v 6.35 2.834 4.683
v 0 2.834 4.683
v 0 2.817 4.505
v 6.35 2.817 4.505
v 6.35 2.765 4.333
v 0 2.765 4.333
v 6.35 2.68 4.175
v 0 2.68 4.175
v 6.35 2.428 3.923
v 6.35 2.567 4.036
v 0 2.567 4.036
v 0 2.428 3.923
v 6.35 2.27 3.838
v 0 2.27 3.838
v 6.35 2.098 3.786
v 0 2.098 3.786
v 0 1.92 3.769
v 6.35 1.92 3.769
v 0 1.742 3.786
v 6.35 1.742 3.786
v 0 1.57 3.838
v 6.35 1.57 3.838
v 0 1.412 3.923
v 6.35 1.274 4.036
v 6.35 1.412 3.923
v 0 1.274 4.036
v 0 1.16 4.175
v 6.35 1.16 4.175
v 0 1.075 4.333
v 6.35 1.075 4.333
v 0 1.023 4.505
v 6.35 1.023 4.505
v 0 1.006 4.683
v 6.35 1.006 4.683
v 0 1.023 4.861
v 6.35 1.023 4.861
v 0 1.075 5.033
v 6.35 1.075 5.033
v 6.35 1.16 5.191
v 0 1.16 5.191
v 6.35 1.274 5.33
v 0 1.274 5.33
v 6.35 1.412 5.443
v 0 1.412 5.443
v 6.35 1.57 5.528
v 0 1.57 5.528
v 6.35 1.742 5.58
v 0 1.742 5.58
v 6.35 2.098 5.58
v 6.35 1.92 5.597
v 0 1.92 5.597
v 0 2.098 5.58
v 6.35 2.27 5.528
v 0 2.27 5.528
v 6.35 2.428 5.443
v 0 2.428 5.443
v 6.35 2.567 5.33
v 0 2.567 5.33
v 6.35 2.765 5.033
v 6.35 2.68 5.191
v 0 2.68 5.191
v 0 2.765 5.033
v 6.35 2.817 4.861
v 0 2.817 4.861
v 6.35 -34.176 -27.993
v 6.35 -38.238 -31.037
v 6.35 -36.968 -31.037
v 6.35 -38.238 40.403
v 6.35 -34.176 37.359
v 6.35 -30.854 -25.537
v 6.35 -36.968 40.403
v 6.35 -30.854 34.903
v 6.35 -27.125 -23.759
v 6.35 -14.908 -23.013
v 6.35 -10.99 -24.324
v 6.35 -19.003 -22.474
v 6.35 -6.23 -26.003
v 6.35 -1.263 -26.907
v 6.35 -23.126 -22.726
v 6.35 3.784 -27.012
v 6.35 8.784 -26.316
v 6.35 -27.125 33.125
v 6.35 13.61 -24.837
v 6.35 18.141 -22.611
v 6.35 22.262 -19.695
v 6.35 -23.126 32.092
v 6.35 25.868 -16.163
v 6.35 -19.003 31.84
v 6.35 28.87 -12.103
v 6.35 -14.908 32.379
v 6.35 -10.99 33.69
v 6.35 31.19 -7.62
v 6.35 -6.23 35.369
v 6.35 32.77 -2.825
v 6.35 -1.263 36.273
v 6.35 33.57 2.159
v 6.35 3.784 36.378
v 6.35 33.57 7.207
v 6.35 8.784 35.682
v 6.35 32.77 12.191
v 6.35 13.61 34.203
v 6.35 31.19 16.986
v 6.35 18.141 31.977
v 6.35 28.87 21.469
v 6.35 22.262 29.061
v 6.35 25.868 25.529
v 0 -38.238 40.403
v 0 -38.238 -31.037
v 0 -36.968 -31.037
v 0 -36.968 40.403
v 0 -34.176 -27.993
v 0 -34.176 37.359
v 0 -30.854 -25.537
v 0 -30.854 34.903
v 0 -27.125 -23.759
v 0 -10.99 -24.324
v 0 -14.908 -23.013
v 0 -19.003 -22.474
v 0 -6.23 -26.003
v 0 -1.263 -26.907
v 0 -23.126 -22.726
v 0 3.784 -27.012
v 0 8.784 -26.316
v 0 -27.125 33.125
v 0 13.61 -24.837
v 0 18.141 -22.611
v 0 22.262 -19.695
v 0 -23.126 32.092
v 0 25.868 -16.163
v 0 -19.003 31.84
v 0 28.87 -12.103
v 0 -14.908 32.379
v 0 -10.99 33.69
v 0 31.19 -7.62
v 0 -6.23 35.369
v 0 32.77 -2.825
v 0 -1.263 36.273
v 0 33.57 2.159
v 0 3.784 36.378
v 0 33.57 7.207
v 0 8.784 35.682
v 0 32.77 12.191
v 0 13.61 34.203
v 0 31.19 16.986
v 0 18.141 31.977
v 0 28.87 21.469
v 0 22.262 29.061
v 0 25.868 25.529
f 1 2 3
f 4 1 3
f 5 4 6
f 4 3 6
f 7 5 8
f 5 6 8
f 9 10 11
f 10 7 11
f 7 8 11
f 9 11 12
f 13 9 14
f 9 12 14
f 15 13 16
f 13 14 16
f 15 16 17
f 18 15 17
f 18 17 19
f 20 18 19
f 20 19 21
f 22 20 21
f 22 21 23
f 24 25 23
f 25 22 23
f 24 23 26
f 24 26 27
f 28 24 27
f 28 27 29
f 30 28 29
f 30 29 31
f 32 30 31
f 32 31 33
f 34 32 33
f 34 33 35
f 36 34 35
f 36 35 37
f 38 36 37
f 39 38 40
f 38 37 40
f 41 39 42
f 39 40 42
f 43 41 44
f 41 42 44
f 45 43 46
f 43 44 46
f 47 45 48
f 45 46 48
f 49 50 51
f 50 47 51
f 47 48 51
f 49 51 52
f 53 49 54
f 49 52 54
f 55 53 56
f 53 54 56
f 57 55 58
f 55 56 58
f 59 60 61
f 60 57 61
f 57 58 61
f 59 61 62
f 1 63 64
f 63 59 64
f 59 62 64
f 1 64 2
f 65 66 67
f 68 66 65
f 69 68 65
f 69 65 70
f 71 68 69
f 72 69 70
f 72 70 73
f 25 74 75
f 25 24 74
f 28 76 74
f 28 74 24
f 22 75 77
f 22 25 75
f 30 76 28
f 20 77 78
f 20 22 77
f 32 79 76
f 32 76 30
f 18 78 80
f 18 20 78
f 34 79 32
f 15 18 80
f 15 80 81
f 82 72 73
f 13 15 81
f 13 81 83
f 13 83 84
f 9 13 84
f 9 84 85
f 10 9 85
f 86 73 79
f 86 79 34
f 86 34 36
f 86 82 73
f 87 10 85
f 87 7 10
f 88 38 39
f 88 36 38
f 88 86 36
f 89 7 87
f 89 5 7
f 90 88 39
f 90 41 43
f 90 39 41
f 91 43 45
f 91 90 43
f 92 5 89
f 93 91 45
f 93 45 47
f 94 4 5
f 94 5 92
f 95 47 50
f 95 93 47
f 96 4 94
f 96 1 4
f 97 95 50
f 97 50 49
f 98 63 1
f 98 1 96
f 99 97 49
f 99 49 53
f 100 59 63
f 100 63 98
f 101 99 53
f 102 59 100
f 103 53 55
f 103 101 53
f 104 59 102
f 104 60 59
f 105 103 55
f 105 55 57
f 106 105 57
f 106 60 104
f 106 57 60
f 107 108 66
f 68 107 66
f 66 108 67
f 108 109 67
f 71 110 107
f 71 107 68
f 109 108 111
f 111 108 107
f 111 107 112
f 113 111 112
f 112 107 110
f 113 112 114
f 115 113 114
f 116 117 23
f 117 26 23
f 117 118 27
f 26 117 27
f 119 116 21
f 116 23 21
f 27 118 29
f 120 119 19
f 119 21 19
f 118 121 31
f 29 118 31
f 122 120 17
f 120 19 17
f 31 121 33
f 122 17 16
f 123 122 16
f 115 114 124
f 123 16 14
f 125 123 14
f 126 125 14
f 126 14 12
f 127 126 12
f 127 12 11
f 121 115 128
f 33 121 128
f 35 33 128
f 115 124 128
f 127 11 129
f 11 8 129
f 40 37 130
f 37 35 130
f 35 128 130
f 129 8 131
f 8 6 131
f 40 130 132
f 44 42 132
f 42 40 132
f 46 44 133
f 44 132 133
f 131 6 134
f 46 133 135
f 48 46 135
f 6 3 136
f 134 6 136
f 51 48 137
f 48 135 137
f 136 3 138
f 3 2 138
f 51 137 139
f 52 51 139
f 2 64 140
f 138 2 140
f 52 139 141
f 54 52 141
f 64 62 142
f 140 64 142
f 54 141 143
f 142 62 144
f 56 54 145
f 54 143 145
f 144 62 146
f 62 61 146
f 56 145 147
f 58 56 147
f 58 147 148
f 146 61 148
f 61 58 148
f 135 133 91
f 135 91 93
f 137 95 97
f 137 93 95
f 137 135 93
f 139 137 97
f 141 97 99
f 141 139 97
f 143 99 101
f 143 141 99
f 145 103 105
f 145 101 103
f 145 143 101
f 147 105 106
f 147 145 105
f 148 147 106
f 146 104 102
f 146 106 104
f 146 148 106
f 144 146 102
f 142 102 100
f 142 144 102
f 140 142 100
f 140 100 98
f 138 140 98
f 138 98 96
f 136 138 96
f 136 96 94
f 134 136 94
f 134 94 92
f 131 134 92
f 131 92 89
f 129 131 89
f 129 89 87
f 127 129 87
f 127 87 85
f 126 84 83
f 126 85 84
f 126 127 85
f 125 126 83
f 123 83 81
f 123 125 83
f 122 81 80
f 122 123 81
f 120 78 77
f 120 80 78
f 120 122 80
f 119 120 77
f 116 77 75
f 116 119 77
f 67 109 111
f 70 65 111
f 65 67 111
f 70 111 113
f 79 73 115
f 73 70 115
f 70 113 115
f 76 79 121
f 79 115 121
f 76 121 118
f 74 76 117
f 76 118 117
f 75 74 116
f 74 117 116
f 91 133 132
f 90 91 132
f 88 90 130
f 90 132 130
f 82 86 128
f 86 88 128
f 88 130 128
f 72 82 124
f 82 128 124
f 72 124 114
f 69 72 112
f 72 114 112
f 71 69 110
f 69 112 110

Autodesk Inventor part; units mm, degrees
ref_plane "YZ Plane" through (0, 0, 0) normal (1, 0, 0) x (0, 1, 0)
ref_plane "XZ Plane" through (0, 0, 0) normal (0, 1, 0) x (-1, 0, 0)
ref_plane "XY Plane" through (0, 0, 0) normal (0, 0, 1) x (1, 0, 0)
sketch "Sketch1" plane through (0, 0, 0) normal (1, 0, 0) x (0, 1, 0)
  arc A0 (-10.9904, -24.3236) -> (-10.9904, 33.6895) centre (1.9201, 4.683) ccw
  arc A1 (-36.9675, 40.4029) -> (-10.9904, 33.6895) centre (-19.7566, 53.3848) ccw
  arc A2 (-10.9904, -24.3236) -> (-36.9675, -31.0369) centre (-19.7566, -44.0189) ccw
  line L0 (-36.9675, 40.4029) -> (-36.9675, -31.0369)
  circle A3 centre (1.9201, 4.683) radius 0.9144
  dimension "d1" = 1.8288
extrude "Extrusion1" add sketch "Sketch1" along normal blind 6.35
sketch "Sketch2" plane through (0, -36.9675, -31.0369) normal (0, -1, 0) x (1, 0, 0)
  point P0 (0, 31.0369)
sketch "Sketch3" plane through (0, -36.9675, -31.0369) normal (0, -1, 0) x (1, 0, 0)
  line L0 (6.35, 71.4398) -> (6.35, 62.8637) projected
  line L1 (0, 71.4398) -> (6.35, 71.4398) projected
  line L2 (6.35, 71.4398) -> (0, 71.4398)
  line L3 (0, 71.4398) -> (0, 0) projected
  line L4 (0, 71.4398) -> (0, 0)
  line L5 (0, 0) -> (6.35, 0) projected
  line L6 (0, 0) -> (6.35, 0)
  line L7 (6.35, 0) -> (6.35, 71.4398)
  point P0 (0, 31.0369)
  point P1 (6.35, 64.7265)
extrude "Extrusion2" add sketch "Sketch3" along normal blind 1.27
properties part number "Base Hinge 2x"
